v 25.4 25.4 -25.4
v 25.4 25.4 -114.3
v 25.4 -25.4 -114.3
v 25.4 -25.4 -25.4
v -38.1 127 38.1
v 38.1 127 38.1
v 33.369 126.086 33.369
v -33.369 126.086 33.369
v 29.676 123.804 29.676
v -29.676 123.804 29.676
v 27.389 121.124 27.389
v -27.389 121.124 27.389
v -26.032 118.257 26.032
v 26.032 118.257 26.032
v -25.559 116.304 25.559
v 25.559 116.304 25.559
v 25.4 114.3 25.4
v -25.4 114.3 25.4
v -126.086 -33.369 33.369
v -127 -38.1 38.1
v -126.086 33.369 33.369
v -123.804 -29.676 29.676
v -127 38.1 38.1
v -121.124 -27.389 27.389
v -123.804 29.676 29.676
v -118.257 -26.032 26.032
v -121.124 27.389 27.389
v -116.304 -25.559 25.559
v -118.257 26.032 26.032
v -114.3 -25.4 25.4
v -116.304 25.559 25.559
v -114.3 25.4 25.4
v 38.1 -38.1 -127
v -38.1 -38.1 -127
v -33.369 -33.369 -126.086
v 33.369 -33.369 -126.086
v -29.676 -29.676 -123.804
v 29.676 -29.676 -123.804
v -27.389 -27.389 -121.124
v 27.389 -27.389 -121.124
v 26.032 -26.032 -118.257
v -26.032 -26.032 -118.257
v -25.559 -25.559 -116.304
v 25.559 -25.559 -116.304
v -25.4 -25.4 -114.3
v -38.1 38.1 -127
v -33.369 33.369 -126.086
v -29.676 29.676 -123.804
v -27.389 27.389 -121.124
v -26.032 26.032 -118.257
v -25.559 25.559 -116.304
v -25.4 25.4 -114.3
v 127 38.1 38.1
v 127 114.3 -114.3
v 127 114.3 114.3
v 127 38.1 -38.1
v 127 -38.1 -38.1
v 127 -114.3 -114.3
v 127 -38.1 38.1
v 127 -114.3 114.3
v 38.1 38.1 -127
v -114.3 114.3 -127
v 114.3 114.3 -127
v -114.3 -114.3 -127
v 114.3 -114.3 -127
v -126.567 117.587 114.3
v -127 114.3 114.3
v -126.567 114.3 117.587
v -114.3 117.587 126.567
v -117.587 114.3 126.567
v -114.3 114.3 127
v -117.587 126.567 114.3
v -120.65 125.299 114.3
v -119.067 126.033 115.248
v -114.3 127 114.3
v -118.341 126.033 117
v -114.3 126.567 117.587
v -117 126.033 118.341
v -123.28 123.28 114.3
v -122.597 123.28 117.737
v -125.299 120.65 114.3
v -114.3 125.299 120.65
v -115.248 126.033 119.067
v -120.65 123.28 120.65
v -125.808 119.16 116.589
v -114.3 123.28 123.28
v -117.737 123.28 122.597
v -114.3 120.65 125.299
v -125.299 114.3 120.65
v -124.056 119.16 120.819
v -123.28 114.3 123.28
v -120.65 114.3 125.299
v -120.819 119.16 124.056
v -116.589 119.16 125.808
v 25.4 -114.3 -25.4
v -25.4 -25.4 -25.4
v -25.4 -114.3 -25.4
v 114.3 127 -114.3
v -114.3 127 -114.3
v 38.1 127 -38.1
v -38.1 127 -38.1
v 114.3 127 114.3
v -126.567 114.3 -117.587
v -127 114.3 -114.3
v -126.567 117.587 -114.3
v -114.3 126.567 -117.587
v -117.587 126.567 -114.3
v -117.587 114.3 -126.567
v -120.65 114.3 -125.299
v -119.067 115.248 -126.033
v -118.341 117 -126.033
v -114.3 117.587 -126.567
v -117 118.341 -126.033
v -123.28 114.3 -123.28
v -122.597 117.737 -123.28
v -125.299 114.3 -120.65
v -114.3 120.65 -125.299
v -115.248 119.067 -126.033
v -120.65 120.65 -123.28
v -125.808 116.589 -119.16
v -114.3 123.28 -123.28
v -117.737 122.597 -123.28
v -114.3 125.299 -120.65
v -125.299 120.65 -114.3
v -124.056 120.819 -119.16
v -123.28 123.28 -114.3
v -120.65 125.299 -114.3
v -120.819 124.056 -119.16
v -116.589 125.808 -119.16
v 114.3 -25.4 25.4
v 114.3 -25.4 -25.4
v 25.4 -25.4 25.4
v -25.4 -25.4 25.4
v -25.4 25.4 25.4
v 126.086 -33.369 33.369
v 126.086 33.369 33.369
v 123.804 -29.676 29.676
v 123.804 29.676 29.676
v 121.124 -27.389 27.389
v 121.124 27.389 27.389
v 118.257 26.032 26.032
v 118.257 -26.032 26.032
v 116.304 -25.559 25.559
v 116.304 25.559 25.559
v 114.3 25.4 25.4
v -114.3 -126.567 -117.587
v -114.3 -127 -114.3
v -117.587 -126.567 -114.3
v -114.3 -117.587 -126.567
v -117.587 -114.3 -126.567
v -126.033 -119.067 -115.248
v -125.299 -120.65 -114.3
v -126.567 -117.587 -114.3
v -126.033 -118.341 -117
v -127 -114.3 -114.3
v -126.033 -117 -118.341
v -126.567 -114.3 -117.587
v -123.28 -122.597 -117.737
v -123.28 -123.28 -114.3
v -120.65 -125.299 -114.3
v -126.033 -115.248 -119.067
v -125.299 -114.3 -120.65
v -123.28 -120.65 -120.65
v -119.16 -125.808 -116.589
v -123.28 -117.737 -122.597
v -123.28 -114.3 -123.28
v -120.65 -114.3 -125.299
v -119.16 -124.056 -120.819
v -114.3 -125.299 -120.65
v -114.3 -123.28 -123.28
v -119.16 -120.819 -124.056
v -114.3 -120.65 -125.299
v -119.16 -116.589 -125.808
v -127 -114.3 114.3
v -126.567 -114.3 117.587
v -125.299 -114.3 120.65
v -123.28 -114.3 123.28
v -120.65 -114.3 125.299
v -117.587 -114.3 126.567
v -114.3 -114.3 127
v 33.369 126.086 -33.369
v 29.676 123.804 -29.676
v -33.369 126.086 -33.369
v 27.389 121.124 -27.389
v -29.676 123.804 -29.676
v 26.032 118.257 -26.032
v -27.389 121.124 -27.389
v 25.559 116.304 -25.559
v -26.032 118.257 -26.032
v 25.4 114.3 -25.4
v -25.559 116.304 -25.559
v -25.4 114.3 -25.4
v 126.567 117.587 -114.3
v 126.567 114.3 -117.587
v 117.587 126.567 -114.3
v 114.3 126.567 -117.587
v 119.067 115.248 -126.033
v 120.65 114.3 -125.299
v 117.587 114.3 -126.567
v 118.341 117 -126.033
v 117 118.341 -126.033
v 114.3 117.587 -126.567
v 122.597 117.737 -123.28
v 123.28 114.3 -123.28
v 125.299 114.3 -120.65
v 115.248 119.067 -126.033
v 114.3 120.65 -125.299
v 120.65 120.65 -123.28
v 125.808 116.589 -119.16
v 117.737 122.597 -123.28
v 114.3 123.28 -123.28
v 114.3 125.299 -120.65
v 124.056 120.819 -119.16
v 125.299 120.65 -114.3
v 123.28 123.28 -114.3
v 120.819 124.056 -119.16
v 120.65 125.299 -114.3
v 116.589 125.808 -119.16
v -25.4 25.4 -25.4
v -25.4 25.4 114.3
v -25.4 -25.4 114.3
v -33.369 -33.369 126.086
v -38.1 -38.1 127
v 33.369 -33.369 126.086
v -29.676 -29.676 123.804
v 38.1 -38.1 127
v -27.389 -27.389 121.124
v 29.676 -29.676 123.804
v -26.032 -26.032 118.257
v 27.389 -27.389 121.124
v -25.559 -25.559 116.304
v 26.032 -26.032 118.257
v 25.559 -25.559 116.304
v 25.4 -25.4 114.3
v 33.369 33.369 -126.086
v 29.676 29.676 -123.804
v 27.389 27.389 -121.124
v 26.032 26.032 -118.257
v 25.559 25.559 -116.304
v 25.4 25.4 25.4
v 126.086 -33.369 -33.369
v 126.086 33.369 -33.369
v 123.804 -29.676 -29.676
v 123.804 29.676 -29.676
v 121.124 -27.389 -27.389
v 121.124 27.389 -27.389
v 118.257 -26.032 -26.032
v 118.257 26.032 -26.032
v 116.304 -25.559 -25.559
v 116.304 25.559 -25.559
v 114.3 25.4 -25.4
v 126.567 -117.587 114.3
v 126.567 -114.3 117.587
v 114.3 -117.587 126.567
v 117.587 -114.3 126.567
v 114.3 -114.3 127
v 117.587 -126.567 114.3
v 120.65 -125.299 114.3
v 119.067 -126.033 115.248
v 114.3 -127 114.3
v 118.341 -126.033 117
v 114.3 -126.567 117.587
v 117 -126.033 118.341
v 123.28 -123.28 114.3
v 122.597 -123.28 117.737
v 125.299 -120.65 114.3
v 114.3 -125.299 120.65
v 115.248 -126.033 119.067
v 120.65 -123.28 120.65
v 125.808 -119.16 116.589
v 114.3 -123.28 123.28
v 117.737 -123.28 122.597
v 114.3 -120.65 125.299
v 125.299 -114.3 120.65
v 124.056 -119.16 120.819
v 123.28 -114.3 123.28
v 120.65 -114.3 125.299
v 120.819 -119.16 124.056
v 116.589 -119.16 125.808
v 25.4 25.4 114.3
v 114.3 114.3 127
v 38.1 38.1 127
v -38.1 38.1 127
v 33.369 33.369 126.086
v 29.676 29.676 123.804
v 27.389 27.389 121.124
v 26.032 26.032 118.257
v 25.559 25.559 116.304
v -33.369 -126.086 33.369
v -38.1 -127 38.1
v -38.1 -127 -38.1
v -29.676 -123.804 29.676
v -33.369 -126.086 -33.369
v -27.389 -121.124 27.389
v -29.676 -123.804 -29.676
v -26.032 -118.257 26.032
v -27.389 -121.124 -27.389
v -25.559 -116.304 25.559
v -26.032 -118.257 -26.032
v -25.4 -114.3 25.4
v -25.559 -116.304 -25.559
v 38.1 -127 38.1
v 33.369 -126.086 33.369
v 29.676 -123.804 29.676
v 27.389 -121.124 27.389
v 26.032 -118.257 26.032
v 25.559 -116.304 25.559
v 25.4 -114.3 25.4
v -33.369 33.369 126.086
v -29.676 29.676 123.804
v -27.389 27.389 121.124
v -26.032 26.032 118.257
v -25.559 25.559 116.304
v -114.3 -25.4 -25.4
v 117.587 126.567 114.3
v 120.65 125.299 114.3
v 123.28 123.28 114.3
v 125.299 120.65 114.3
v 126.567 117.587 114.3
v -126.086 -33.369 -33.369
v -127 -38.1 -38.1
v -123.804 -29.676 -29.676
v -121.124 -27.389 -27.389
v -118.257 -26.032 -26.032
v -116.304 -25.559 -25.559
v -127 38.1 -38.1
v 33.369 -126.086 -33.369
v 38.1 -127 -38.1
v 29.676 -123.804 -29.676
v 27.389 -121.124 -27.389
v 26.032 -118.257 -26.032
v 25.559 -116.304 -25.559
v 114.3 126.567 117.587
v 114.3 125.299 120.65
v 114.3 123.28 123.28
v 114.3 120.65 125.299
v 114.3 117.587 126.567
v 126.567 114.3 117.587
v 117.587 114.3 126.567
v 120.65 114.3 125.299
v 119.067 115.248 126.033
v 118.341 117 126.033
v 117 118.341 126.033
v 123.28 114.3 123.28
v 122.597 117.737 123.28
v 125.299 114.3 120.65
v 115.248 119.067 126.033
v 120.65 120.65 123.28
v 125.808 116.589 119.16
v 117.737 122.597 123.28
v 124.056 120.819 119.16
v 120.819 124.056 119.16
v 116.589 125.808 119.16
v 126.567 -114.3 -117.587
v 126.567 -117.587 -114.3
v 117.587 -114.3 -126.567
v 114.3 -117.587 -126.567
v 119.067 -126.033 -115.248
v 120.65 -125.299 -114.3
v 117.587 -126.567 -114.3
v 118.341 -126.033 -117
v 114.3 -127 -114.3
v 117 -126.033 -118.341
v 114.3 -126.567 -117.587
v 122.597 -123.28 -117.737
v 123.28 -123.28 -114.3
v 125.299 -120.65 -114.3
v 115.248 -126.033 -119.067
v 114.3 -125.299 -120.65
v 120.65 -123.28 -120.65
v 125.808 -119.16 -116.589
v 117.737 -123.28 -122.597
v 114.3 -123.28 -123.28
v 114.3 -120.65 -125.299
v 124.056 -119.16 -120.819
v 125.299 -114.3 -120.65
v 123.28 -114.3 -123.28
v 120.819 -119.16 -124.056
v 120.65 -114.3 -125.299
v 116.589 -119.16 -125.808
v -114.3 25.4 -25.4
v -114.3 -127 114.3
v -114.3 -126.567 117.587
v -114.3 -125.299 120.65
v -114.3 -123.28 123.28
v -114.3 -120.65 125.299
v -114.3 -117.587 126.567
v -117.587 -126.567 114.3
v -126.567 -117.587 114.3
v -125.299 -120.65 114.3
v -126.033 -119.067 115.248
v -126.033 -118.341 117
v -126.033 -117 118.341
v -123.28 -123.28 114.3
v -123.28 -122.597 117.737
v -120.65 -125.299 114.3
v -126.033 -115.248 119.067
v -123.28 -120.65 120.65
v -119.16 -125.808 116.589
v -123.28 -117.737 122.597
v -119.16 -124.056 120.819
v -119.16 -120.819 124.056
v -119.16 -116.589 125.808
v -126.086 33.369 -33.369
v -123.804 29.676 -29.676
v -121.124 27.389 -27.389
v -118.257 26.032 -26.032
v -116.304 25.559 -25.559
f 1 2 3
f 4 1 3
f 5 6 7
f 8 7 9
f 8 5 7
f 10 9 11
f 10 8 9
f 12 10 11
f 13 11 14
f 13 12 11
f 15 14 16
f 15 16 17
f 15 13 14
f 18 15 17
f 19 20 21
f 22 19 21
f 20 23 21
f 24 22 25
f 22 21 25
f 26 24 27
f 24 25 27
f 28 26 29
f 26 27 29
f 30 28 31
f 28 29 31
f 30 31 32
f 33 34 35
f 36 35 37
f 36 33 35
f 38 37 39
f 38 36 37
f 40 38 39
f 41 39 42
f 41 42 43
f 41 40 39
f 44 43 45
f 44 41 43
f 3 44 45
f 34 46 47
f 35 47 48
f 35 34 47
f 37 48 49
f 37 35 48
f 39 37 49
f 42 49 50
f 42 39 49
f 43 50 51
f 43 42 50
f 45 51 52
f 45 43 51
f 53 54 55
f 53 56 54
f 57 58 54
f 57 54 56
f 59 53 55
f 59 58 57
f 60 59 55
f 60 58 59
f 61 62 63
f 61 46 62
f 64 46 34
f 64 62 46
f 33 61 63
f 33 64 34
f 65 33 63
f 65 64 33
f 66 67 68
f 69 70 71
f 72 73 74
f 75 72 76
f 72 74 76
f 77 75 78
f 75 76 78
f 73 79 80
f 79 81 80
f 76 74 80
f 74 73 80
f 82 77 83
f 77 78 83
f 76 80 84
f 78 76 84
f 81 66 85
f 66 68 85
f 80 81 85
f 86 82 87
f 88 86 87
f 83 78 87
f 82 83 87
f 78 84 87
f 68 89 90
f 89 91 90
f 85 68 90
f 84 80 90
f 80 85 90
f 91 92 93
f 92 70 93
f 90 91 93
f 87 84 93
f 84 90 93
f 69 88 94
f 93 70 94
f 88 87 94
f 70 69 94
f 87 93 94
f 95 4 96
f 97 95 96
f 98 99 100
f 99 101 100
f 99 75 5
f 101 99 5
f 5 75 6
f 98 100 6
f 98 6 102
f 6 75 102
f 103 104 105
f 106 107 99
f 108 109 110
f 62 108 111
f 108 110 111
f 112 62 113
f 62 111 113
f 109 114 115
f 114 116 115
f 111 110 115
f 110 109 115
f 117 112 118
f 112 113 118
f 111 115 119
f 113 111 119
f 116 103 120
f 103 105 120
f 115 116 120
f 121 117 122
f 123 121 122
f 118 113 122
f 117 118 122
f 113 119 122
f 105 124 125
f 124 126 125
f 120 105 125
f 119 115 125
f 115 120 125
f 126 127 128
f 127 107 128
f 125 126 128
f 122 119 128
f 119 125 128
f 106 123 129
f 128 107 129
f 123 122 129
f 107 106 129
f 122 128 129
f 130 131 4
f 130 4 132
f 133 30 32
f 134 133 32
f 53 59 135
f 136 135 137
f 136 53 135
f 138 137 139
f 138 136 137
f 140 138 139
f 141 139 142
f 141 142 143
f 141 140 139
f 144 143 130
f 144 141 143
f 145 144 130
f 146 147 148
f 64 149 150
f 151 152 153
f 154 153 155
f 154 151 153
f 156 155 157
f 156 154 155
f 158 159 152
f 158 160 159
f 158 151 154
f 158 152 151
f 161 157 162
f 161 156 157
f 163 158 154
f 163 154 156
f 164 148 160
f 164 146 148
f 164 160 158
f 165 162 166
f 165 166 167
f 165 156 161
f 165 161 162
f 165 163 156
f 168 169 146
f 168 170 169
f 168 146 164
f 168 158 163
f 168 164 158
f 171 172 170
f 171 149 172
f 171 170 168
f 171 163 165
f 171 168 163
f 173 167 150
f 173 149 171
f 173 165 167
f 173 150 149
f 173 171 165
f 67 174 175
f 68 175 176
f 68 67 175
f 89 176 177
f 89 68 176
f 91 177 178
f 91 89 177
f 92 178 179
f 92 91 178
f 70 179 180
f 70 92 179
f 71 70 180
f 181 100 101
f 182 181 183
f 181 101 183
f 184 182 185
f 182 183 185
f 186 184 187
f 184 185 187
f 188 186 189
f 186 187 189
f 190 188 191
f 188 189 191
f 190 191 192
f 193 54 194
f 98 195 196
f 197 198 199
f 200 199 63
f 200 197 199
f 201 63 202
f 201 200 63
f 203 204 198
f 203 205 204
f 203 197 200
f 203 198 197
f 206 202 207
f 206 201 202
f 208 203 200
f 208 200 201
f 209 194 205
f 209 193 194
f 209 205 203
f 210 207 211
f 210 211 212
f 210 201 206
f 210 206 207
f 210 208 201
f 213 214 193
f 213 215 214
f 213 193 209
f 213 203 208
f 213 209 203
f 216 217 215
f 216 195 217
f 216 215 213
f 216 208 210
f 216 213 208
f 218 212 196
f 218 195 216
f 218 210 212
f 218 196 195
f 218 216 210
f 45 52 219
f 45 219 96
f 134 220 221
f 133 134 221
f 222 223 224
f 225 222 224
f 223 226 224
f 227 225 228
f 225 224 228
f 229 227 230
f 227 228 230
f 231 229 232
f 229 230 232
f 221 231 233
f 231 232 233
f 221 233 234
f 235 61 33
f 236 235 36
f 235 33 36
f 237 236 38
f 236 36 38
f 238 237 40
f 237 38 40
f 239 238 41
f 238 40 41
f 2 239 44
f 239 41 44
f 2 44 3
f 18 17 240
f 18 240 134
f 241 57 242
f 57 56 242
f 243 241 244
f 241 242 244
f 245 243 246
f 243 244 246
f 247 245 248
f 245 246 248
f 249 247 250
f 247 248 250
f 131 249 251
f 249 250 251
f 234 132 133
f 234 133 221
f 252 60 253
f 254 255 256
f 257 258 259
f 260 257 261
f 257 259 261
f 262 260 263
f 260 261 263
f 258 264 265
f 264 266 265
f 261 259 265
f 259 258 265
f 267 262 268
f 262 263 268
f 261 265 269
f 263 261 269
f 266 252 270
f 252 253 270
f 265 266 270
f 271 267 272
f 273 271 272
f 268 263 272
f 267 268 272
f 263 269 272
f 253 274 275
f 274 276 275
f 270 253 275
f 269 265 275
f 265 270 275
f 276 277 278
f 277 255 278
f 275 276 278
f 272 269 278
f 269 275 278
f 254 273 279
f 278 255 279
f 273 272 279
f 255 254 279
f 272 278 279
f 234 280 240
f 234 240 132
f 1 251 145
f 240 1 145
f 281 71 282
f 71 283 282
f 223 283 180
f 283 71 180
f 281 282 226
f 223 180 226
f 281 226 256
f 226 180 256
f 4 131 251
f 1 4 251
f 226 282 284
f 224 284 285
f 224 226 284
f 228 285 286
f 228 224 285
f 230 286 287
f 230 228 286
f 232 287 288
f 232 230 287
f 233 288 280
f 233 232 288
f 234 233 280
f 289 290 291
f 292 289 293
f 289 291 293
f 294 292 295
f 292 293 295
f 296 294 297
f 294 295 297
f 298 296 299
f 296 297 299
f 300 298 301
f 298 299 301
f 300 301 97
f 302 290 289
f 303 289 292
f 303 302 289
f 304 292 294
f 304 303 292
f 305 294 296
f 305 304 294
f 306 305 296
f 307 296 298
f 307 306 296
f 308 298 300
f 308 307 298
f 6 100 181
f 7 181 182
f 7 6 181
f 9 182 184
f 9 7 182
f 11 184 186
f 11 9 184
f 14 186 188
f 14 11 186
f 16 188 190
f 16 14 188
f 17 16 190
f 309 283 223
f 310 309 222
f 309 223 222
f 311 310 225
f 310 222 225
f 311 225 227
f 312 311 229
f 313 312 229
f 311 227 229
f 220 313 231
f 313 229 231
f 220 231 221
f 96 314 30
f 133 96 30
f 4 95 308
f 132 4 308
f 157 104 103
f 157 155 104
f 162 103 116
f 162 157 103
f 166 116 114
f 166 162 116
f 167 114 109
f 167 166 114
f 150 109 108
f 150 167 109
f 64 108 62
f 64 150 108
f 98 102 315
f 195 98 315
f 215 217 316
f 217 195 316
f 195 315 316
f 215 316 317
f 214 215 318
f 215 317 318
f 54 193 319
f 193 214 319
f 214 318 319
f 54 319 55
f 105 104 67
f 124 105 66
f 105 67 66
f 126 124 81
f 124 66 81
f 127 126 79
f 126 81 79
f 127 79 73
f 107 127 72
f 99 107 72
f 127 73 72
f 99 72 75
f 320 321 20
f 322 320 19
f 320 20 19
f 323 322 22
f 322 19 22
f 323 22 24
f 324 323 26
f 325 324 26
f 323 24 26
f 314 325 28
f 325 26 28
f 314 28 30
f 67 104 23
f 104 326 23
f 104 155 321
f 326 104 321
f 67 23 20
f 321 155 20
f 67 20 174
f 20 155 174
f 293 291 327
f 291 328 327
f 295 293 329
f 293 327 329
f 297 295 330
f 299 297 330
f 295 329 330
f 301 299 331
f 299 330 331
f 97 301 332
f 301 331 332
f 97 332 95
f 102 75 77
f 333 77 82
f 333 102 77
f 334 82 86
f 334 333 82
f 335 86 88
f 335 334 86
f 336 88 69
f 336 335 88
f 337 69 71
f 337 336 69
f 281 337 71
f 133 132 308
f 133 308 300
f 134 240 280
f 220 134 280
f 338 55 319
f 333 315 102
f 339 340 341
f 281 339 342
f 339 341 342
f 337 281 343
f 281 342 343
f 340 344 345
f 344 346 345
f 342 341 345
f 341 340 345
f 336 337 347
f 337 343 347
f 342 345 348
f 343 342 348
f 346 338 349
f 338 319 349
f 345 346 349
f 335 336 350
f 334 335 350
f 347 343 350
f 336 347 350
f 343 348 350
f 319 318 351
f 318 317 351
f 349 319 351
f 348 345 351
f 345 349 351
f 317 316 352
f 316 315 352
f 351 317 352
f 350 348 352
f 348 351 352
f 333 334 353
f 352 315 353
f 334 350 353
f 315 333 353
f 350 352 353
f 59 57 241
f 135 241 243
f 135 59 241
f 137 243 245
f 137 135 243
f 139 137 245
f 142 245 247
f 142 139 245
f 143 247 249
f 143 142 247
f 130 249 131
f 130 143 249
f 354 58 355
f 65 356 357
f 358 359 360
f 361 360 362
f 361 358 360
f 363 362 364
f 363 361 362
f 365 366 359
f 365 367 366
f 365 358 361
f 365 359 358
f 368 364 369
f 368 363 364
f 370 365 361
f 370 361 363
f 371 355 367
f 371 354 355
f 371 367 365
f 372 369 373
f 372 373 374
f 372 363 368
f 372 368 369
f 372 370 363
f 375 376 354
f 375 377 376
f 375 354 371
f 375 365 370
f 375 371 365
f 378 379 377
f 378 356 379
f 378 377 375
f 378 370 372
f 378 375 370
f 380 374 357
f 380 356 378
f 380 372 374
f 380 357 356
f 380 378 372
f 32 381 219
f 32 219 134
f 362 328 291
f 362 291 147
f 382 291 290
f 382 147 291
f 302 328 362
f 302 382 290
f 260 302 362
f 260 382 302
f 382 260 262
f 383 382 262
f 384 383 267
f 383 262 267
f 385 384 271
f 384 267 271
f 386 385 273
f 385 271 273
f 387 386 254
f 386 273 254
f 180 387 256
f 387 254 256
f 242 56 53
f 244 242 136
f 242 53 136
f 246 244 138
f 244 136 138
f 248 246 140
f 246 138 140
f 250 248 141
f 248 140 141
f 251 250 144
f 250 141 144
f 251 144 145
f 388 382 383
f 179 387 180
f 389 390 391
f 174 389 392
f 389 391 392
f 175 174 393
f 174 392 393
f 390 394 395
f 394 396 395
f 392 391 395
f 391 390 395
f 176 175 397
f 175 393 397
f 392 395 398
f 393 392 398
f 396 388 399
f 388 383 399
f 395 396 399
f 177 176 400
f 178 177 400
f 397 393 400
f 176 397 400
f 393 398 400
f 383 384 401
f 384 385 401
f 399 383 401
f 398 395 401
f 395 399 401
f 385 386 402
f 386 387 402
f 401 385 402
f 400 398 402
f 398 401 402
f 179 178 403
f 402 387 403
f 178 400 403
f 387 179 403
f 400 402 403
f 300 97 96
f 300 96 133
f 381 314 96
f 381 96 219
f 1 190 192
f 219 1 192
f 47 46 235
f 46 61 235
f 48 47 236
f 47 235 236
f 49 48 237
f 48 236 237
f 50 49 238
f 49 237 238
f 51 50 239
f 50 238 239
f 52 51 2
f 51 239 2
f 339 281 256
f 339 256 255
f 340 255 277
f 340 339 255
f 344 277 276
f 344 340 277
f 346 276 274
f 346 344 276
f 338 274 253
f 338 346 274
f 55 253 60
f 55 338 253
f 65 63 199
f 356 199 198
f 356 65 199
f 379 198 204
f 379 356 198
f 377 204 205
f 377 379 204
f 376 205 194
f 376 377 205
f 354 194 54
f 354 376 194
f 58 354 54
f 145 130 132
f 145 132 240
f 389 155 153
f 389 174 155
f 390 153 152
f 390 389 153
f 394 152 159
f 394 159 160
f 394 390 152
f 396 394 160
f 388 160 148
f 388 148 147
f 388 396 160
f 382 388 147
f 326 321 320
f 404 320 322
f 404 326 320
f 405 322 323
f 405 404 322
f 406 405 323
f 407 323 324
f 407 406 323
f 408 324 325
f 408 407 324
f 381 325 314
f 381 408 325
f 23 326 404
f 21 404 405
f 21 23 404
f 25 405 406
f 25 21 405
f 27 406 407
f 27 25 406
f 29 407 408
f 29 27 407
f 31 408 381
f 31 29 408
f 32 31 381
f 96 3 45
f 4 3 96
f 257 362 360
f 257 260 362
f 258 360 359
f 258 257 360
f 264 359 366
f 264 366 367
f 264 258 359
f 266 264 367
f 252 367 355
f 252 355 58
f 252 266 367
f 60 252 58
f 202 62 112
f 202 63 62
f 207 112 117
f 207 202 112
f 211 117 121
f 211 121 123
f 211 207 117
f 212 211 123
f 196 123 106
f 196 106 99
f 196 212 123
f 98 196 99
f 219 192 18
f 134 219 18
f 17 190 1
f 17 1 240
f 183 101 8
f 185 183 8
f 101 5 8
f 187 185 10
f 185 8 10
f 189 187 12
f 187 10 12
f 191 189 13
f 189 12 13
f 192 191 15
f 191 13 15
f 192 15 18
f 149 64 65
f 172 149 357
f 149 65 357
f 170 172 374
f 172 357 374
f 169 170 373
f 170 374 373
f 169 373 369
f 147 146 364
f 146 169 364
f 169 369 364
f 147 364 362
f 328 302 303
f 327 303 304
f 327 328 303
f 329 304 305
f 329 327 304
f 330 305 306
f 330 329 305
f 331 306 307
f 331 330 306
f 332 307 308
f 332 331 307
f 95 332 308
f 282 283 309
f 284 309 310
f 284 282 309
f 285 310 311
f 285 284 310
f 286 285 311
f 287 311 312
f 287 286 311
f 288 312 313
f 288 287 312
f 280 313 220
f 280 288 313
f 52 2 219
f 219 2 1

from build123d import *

# Parameters (mm, degrees)
F0_W     = 254
F0_H     = 254
F6_DEPTH = 127
F7_W     = 50.8
F7_H     = 50.8
F1_DEPTH = 254.001
F2_W     = 50.8
F2_H     = 50.8
F3_DEPTH = 254.001
F4_W     = 50.8
F4_H     = 50.8
F8_DEPTH = 254.001
F9_R     = 12.7


with BuildPart() as f6:
    # F0 (on Front) → F6 (new body, symmetric)
    with BuildSketch(Plane.XZ):
        Rectangle(F0_W, F0_H)
    extrude(amount=F6_DEPTH, both=True)

    # F7 (on face) → F1 (cut, through all)
    with BuildSketch(Plane(origin=(0, 0, -127), x_dir=(1, 0, 0), z_dir=(0, 0, -1))):
        Rectangle(F7_W, F7_H)
    extrude(amount=-F1_DEPTH, mode=Mode.SUBTRACT)

    # F2 (on face) → F3 (cut, through all)
    with BuildSketch(Plane.YZ.offset(127)):
        Rectangle(F2_W, F2_H)
    extrude(amount=-F3_DEPTH, mode=Mode.SUBTRACT)

    # F4 (on face) → F8 (cut, through all)
    with BuildSketch(Plane(origin=(0, 127, 0), x_dir=(-1, 0, 0), z_dir=(0, 1, 0))):
        Rectangle(F4_W, F4_H)
    extrude(amount=-F8_DEPTH, mode=Mode.SUBTRACT)

    # F9
    f9_edges = [f6.edges().sort_by_distance(p)[0] for p in [
        (127, 127, 0),
        (127, 0, -127),
        (127, 0, 127),
        (127, -127, 0),
        (127, 25.4, 0),
        (127, 0, 25.4),
        (127, -25.4, 0),
        (127, 0, -25.4),
        (0, -127, -127),
        (0, -127, 127),
        (-127, -127, 0),
        (-25.4, -127, 0),
        (0, -127, -25.4),
        (25.4, -127, 0),
        (0, -127, 25.4),
        (-127, 0, 127),
        (-127, 127, 0),
        (-127, 0, -127),
        (-127, 25.4, 0),
        (-127, 0, -25.4),
        (-127, -25.4, 0),
        (-127, 0, 25.4),
        (0, 127, -127),
        (0, 127, 127),
        (0, 127, -25.4),
        (25.4, 127, 0),
        (0, 127, 25.4),
        (-25.4, 127, 0),
        (25.4, 0, 127),
        (0, 25.4, 127),
        (-25.4, 0, 127),
        (0, -25.4, 127),
        (25.4, 0, -127),
        (0, -25.4, -127),
        (-25.4, 0, -127),
        (0, 25.4, -127),
    ]]
    fillet(f9_edges, radius=F9_R)


solid = f6.part
